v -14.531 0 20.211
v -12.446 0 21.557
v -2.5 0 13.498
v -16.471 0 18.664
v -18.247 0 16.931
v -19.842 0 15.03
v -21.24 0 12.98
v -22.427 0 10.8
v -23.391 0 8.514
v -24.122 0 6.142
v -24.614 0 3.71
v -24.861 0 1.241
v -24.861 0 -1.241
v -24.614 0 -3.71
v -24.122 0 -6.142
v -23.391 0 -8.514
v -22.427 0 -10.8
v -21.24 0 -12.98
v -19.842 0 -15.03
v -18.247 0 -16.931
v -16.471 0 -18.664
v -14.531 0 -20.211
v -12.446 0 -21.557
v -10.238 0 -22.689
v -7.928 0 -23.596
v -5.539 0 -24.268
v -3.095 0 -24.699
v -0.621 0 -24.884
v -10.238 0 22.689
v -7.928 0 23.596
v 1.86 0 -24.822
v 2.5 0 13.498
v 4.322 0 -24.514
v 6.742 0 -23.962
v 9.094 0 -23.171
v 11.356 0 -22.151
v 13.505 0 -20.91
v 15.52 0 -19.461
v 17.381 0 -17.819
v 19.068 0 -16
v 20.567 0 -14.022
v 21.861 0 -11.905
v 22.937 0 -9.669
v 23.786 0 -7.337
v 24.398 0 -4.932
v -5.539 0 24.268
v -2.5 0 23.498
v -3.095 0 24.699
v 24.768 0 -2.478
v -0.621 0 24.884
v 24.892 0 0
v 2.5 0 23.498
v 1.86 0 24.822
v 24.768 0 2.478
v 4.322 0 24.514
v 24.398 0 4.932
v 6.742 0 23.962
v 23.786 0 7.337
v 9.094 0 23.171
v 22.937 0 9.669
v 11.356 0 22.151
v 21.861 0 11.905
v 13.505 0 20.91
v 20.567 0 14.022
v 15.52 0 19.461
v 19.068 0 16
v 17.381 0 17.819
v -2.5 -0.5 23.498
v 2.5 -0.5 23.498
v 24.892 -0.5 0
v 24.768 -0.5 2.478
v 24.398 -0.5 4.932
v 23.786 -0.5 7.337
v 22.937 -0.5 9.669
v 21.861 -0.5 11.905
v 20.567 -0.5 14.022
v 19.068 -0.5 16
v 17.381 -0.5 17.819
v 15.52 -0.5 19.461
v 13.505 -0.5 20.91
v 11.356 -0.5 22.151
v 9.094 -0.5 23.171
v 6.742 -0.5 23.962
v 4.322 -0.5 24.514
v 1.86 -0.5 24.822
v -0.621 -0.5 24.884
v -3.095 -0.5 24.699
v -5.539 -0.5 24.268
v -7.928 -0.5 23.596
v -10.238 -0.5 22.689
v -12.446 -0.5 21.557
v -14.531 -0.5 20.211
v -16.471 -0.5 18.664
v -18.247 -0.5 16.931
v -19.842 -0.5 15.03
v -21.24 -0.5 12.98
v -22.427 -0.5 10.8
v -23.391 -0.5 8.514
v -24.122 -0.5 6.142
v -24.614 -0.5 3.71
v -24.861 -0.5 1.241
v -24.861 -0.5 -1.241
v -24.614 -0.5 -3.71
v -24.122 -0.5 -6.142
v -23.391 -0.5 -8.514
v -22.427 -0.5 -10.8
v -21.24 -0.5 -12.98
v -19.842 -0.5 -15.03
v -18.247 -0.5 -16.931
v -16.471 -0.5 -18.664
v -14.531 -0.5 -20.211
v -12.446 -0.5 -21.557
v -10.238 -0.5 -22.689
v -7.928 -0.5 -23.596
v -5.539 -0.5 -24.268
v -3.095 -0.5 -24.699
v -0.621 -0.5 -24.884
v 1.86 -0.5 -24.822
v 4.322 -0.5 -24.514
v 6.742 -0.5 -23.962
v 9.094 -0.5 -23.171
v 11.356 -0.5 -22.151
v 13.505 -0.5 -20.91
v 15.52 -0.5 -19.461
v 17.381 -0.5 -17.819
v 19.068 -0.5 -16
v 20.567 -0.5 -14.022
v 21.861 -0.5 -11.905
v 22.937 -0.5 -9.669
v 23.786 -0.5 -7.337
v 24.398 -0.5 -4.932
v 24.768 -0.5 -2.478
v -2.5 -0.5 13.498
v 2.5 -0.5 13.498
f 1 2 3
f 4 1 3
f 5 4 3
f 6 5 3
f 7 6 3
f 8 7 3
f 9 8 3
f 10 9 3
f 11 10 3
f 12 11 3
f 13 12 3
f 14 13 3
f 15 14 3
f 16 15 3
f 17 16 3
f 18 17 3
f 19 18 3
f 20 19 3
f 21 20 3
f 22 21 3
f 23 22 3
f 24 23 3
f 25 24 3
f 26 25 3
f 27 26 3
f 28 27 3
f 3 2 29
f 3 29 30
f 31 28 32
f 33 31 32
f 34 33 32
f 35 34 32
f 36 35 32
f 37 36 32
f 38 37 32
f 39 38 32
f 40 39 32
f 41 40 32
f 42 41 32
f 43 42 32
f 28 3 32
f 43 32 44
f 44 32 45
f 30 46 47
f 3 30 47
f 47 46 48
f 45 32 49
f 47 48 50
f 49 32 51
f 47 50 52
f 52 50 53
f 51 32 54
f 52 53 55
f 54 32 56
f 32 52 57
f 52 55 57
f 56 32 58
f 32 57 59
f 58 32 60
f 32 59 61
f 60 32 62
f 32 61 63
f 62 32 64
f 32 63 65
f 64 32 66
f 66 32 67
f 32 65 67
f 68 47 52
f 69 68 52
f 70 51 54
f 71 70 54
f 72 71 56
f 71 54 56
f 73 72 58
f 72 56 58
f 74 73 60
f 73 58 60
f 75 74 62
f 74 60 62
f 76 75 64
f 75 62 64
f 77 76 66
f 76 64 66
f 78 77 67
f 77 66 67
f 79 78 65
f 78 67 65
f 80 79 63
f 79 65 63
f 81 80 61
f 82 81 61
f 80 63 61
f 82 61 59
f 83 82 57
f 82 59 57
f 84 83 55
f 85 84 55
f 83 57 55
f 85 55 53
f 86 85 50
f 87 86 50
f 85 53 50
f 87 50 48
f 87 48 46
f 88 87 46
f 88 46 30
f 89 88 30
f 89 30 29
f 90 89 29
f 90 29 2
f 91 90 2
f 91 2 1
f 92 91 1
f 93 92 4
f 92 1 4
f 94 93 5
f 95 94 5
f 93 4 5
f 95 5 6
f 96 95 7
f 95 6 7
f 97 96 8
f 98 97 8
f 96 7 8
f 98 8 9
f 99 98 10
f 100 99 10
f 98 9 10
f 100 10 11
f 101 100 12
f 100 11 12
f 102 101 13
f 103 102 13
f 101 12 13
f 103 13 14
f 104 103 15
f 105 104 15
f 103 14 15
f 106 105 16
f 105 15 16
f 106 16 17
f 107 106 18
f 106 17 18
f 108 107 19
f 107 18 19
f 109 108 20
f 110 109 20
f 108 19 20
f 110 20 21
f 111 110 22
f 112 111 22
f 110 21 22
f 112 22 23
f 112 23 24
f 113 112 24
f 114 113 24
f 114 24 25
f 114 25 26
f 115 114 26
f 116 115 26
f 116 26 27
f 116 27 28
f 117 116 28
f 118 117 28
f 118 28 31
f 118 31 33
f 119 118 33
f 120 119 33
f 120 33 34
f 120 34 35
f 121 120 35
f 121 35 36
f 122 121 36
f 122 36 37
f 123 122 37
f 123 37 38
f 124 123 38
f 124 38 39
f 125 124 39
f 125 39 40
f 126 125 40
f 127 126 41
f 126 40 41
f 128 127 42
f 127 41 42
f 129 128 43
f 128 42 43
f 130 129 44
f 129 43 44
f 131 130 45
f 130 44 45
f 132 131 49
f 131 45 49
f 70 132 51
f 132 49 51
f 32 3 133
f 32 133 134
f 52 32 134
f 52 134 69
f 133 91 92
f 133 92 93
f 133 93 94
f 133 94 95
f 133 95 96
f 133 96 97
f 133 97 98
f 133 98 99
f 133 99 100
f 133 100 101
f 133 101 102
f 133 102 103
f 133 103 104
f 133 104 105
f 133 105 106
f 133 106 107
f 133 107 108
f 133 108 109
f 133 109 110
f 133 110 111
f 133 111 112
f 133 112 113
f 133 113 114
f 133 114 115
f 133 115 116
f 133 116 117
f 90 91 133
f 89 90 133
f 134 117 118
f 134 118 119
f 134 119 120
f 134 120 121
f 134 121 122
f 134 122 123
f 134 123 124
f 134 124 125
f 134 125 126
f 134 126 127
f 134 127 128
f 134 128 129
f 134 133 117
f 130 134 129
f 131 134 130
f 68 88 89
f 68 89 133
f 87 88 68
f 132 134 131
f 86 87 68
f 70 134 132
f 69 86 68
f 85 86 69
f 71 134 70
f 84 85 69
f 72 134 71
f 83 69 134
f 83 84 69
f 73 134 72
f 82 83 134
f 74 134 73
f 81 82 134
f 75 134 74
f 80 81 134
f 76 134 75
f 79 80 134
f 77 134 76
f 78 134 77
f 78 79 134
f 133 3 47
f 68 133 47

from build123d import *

# Parameters (mm, degrees)
F2_R     = 24.892
F5_DEPTH = 0.5
F1_W     = 5
F1_H     = 10
F6_DEPTH = 2.6162


# Not quite as in the source:
# - the program builds the solid bodies; features that only make, move or delete a surface that nothing else refers to are left out


with BuildPart() as f5:
    # F2 (on Front) → F5 (new body)
    with BuildSketch(Plane.XZ):
        Circle(F2_R)
    extrude(amount=F5_DEPTH)

    # F1 (on Front) → F6 (cut)
    with BuildSketch(Plane.XZ):
        with Locations((0, 18.4979066253)):
            Rectangle(F1_W, F1_H)
    extrude(amount=F6_DEPTH, mode=Mode.SUBTRACT)


solid = f5.part
